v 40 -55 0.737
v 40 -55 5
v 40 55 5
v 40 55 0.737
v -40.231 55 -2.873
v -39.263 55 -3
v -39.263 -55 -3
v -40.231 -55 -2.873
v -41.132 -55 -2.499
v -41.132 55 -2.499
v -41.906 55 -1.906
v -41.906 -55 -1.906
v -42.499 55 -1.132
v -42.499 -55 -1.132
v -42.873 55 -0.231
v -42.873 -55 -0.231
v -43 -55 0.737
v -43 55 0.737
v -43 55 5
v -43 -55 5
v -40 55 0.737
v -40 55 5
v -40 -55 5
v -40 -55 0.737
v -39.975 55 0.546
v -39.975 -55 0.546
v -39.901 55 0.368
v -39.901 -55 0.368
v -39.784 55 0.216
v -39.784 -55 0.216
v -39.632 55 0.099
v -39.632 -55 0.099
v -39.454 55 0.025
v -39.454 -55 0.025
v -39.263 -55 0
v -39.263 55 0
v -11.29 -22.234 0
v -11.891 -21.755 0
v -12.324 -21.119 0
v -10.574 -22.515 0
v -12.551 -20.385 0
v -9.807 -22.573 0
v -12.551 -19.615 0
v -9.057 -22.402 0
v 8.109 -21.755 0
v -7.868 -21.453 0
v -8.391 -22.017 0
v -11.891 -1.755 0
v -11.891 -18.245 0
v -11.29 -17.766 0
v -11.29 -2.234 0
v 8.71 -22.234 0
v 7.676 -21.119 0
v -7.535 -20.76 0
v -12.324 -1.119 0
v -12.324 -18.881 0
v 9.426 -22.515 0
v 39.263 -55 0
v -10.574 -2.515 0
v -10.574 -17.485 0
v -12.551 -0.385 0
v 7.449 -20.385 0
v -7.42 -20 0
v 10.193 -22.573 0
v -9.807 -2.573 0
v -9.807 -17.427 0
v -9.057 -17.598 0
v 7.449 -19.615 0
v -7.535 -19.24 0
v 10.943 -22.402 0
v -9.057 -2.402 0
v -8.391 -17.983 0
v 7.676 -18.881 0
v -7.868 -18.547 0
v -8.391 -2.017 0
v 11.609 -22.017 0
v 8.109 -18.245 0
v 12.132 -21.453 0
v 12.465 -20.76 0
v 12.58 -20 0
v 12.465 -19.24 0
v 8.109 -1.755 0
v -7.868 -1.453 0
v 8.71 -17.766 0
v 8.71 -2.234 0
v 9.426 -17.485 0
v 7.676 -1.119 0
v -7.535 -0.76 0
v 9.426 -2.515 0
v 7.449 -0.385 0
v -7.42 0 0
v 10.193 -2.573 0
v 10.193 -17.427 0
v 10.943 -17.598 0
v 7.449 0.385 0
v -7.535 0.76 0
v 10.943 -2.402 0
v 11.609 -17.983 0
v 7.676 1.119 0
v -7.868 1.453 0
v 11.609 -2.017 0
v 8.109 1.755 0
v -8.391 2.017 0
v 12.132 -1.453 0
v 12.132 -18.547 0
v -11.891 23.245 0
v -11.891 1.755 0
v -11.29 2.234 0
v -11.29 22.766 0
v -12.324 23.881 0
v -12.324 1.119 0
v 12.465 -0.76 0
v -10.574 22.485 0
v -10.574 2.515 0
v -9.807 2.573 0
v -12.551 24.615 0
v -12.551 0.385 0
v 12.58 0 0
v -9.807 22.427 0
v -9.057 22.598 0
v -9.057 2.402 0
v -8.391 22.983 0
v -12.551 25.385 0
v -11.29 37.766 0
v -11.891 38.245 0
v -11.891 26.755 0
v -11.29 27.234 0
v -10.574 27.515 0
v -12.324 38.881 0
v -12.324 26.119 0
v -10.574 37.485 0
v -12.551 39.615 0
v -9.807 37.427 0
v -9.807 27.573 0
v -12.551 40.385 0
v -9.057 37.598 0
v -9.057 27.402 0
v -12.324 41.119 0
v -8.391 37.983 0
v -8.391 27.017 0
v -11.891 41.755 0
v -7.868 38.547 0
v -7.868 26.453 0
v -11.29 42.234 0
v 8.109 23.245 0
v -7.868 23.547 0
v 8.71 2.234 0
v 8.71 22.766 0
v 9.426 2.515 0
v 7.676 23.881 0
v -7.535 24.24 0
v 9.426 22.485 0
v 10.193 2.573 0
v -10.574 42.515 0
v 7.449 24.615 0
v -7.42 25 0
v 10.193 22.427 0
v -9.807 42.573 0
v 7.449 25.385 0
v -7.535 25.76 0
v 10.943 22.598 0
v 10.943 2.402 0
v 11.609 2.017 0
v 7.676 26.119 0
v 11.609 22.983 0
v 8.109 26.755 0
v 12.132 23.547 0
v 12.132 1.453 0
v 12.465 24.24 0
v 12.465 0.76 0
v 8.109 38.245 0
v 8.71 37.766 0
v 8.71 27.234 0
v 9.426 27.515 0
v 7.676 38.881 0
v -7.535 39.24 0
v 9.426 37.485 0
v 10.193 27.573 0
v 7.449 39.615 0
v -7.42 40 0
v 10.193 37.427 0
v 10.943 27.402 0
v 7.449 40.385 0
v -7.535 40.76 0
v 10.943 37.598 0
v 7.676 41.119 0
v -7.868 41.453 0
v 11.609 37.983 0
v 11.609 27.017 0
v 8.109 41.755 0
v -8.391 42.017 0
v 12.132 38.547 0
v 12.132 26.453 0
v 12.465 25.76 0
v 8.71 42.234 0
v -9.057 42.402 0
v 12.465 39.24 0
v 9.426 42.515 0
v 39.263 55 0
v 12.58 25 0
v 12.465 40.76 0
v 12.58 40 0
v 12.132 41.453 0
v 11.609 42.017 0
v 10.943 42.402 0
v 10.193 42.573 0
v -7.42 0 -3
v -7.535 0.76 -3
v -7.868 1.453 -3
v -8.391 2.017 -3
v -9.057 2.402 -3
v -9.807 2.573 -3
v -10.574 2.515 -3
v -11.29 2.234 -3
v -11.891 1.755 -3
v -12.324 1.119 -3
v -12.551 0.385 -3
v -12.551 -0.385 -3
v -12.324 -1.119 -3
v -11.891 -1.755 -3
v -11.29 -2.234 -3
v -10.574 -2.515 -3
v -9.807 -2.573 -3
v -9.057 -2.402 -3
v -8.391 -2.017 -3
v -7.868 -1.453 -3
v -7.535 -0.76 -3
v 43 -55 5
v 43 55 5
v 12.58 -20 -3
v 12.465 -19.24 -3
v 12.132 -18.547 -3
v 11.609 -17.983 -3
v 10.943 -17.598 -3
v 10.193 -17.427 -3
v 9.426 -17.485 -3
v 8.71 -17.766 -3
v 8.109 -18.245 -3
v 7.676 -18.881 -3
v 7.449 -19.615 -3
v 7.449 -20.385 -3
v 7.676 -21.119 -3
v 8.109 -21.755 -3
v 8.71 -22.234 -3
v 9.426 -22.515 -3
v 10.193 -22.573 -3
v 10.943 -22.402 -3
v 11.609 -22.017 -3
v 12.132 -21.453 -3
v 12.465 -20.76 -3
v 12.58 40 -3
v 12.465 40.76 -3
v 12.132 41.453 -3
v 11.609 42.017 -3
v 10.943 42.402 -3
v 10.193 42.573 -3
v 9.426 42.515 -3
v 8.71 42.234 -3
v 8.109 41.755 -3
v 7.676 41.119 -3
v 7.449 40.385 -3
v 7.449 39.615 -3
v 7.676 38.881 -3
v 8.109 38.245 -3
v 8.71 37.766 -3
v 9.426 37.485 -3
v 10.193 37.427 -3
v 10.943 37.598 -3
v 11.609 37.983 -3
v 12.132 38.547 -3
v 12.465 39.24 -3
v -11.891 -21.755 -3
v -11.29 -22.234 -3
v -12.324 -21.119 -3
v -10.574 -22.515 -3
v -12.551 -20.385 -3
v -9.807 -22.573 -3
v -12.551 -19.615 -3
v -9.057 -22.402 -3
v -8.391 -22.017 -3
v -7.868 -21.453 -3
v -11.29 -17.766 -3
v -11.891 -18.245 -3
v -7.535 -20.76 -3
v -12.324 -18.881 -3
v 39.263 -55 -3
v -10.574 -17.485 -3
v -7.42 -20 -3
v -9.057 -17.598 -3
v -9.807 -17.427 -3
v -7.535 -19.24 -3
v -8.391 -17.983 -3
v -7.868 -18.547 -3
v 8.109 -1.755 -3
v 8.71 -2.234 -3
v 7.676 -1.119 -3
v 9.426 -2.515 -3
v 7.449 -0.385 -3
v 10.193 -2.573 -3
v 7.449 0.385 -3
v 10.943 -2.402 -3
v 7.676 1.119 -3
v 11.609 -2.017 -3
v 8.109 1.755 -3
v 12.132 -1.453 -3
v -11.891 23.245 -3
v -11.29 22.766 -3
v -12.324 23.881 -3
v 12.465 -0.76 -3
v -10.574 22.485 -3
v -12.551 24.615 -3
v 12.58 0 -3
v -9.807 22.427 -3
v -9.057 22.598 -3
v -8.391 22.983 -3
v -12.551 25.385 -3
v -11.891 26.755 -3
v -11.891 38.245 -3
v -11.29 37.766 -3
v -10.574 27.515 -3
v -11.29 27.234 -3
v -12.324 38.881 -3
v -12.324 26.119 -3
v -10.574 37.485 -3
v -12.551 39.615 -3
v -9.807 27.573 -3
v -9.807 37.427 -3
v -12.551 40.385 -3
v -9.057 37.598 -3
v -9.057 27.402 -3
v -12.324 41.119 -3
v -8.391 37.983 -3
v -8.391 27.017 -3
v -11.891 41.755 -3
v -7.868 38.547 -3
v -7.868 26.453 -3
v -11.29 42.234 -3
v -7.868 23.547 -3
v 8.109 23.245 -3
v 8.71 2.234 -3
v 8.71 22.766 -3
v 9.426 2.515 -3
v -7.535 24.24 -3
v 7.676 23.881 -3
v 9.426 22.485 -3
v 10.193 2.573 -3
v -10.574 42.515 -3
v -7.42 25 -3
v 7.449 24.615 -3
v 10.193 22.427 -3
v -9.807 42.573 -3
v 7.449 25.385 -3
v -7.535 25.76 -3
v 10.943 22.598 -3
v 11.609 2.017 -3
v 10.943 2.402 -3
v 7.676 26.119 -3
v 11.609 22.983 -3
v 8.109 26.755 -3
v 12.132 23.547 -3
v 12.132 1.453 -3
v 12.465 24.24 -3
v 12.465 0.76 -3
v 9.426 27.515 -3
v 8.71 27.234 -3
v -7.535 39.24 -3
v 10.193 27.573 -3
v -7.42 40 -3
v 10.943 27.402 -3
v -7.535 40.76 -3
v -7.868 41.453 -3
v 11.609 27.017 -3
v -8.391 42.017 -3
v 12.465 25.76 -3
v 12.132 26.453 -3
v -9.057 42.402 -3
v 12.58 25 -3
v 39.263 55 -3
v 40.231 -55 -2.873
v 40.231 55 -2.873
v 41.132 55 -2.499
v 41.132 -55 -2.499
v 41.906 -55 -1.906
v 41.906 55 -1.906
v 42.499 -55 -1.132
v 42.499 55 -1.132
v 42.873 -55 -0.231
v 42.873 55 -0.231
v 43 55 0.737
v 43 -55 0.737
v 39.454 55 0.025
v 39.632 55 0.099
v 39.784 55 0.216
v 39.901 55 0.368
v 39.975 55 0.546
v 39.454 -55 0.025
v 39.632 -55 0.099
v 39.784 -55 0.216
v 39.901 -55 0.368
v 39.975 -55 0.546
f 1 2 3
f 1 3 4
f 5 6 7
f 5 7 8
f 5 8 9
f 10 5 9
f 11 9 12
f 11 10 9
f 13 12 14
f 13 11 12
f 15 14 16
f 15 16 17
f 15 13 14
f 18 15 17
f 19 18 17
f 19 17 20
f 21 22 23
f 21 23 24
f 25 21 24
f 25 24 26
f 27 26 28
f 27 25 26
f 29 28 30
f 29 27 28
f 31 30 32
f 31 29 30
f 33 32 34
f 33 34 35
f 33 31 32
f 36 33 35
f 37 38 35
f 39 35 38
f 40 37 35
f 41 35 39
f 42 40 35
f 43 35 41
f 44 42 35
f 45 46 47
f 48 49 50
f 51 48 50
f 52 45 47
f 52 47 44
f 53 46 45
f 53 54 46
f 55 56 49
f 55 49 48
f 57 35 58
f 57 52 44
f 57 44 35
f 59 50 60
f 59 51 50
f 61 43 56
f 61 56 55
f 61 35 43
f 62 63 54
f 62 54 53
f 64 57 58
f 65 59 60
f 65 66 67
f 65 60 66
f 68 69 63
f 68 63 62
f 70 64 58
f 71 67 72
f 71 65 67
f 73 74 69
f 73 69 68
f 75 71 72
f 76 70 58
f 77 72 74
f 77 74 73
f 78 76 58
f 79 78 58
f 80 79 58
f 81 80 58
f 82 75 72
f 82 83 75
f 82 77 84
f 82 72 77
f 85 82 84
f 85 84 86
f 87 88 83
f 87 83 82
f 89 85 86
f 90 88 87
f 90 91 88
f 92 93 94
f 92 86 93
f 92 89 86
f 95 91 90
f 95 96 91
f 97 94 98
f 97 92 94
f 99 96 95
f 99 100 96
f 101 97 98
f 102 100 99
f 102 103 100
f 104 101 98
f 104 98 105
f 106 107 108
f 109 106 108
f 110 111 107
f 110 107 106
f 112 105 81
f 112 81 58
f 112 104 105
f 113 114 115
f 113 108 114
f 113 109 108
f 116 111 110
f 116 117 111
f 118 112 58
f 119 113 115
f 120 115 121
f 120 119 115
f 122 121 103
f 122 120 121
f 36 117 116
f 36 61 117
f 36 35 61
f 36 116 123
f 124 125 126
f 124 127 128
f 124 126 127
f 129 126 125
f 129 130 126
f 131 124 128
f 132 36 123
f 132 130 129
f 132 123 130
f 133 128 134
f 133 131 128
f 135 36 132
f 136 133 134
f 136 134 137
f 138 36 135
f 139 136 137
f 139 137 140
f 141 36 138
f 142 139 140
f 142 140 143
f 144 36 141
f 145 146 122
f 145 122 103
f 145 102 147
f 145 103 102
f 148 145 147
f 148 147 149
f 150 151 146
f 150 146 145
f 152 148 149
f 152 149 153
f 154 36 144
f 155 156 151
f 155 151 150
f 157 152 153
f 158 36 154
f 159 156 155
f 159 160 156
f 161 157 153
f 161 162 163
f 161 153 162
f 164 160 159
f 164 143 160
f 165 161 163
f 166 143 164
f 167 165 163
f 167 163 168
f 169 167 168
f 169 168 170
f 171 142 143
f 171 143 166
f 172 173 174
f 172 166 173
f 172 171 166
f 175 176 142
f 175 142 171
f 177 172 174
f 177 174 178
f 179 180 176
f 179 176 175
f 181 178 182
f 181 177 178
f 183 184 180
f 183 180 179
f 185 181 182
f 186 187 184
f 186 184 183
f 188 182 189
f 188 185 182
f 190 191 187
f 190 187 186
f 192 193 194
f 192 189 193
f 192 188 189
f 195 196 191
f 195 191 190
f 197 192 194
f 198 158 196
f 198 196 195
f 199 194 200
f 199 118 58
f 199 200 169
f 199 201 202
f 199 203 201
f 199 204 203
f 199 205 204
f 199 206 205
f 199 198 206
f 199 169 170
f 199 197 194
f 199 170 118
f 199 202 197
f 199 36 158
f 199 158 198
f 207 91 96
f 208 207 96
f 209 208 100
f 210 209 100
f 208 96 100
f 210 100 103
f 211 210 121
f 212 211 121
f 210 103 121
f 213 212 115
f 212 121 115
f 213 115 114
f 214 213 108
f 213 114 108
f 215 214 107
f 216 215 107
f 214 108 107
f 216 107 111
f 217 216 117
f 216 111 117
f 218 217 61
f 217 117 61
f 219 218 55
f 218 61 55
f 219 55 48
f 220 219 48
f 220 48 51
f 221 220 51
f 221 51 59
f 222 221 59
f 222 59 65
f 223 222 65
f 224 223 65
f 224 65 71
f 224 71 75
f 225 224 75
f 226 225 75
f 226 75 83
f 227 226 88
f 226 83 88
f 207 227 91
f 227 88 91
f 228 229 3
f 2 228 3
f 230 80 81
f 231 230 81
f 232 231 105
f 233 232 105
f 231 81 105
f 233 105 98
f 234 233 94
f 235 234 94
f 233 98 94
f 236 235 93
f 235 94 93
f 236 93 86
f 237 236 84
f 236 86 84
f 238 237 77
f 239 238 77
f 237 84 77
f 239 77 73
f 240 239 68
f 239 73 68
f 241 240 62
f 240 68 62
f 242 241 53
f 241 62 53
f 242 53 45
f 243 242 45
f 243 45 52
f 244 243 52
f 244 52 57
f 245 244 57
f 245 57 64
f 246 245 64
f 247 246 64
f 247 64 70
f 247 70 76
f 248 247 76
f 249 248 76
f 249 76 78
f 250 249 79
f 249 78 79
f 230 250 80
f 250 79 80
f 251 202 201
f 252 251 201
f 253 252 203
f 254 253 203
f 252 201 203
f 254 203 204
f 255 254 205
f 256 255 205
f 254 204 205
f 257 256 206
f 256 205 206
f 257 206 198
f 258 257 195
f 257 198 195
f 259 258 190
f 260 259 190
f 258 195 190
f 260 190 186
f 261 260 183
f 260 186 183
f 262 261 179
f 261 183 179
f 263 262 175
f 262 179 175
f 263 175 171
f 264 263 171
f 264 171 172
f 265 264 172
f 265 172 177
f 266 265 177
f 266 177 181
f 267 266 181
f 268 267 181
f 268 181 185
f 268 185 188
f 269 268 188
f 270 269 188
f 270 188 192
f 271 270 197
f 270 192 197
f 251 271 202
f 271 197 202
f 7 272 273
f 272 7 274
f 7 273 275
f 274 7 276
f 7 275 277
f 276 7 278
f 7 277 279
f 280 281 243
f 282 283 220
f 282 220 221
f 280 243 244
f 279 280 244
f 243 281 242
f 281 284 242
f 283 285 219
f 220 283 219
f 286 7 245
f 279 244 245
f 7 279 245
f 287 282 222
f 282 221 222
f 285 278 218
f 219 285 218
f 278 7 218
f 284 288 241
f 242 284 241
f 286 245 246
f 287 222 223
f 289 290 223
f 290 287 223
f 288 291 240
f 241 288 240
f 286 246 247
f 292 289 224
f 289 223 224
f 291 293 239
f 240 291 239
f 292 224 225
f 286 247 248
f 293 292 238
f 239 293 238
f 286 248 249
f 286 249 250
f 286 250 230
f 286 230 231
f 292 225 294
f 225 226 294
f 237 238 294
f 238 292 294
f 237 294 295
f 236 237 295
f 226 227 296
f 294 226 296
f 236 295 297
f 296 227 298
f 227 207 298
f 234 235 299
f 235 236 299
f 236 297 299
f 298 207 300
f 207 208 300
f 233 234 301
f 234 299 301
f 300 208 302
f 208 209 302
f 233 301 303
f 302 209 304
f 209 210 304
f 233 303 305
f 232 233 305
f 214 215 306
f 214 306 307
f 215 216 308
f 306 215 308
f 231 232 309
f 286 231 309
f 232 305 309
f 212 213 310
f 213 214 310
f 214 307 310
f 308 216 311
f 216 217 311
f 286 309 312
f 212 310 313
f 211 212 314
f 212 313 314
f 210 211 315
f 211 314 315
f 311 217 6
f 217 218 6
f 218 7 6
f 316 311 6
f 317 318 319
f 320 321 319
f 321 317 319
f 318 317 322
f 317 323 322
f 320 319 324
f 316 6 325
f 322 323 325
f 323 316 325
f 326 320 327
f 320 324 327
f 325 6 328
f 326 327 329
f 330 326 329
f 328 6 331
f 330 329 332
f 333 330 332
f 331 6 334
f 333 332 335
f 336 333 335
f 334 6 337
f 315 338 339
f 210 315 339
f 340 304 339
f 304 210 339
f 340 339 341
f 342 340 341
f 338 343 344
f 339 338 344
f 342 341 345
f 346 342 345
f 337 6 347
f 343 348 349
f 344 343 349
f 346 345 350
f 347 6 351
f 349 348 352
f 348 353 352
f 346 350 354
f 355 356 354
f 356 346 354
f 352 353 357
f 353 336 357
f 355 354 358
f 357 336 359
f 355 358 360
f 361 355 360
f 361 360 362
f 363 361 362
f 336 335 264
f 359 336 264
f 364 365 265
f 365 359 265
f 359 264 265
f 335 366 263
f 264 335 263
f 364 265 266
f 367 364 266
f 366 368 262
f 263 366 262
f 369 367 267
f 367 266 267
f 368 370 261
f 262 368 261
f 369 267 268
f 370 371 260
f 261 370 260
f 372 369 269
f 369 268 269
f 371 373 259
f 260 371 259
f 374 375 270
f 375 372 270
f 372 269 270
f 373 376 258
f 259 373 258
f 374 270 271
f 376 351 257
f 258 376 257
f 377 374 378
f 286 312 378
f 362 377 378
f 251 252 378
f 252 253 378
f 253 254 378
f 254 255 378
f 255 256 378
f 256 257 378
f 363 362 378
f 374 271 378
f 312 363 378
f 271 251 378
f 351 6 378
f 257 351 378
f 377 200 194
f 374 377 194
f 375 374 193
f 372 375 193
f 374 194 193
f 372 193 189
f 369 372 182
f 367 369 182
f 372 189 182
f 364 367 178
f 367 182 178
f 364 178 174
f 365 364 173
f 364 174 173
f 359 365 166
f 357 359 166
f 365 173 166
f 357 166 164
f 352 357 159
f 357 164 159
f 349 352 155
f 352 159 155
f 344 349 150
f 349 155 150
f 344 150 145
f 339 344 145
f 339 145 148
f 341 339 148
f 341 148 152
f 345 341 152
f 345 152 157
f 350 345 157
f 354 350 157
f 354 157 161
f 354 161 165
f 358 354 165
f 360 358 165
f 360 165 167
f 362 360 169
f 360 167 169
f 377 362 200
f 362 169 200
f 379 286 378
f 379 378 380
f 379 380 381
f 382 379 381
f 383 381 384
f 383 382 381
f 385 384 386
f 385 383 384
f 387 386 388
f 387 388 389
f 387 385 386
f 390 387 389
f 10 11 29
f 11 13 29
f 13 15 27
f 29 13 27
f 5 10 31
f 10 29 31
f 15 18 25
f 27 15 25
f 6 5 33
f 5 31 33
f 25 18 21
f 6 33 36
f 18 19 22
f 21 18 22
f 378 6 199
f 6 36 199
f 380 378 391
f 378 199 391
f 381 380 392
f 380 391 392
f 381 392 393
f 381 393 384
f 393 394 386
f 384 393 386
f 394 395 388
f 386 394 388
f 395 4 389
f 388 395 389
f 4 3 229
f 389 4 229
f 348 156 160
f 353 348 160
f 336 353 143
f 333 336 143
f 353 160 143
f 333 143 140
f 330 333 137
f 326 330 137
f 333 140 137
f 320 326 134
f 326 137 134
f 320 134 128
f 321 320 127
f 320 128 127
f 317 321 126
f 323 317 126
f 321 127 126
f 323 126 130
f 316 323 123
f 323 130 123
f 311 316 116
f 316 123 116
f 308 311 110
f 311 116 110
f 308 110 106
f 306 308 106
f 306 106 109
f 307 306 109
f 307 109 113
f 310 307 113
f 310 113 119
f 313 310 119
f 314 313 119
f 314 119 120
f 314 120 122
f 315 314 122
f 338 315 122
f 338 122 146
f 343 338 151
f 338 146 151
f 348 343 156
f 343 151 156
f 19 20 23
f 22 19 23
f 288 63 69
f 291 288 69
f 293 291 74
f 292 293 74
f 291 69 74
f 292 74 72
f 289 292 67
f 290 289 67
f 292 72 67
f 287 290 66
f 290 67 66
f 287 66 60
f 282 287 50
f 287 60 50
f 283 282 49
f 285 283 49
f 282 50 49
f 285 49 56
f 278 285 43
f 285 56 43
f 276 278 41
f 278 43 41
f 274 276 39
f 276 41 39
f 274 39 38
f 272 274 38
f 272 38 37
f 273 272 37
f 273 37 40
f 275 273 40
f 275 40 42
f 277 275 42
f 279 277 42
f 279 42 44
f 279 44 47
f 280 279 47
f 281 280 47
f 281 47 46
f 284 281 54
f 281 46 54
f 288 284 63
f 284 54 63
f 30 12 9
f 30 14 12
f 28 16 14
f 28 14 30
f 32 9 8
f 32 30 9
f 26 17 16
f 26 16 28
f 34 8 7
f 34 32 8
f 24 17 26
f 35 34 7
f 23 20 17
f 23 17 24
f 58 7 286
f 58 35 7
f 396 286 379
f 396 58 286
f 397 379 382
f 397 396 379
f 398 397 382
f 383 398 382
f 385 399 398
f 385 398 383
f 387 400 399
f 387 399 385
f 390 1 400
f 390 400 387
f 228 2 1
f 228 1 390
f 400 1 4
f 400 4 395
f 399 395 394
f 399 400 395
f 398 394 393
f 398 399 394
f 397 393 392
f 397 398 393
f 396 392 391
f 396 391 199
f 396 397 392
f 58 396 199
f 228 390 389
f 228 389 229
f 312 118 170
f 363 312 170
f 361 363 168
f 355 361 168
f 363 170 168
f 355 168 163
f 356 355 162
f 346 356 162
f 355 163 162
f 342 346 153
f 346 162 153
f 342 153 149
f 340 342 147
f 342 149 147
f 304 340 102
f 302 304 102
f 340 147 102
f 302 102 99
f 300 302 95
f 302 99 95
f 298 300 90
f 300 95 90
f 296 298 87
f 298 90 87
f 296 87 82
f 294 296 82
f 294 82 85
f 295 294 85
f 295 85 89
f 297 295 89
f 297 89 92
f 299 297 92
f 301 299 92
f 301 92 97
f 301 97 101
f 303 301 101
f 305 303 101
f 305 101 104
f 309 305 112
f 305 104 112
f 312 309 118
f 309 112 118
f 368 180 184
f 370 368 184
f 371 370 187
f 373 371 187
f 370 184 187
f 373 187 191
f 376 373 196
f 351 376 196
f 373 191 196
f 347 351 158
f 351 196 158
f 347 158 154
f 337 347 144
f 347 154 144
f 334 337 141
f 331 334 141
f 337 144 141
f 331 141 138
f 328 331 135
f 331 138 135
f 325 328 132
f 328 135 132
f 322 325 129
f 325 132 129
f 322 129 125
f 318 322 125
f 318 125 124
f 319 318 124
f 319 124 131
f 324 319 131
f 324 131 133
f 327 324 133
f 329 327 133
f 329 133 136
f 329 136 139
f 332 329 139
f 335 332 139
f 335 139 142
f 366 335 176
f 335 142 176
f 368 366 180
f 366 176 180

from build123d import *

# Parameters (mm, degrees)
SKETCH1_W                      = 86
SKETCH1_H                      = 110
BASE_FLANGE1_DEPTH             = 3
SKETCH6_R                      = 2.58
CUT_EXTRUDE1_DEPTH             = 3
EDGE_FLANGE1_STRIP_W           = 13.4732
EDGE_FLANGE1_STRIP_H           = 3
EDGE_FLANGE1_STRIP_CUT_DEPTH   = 110
EDGE_FLANGE1_STRIP_2_W         = 13.4732
EDGE_FLANGE1_STRIP_2_H         = 3
EDGE_FLANGE1_STRIP_CUT_2_DEPTH = 110
EDGE_FLANGE1_DEPTH             = 110
EDGE_FLANGE1_BEND_DEPTH        = 110


# Sheet-metal steps are written as plain solids
with BuildPart() as part:
    # Sketch1 → Base-Flange1 (new body)
    with BuildSketch(Plane.XY):
        Rectangle(SKETCH1_W, SKETCH1_H)
    extrude(amount=-BASE_FLANGE1_DEPTH)

    # Sketch6 → Cut-Extrude1 (cut)
    with BuildSketch(Plane.XY):
        with Locations((-10, 40)):
            Circle(SKETCH6_R)
        with Locations((10, 40)):
            Circle(SKETCH6_R)
        with Locations((-10, 25)):
            Circle(SKETCH6_R)
        with Locations((10, 25)):
            Circle(SKETCH6_R)
        with Locations((10, 0)):
            Circle(SKETCH6_R)
        with Locations((-10, 0)):
            Circle(SKETCH6_R)
        with Locations((-10, -20)):
            Circle(SKETCH6_R)
        with Locations((10, -20)):
            Circle(SKETCH6_R)
    extrude(amount=-CUT_EXTRUDE1_DEPTH, mode=Mode.SUBTRACT)

    # Edge-Flange1 strip (across the edge) → Edge-Flange1 strip cut (cut)
    with BuildSketch(Plane(origin=(-43, 55, 0), x_dir=(1, 0, 0), z_dir=(0, -1, 0))):
        with Locations((-3, -1.5)):
            Rectangle(EDGE_FLANGE1_STRIP_W, EDGE_FLANGE1_STRIP_H)
    extrude(amount=EDGE_FLANGE1_STRIP_CUT_DEPTH, mode=Mode.SUBTRACT)

    # Edge-Flange1 strip 2 (across the edge) → Edge-Flange1 strip cut 2 (cut)
    with BuildSketch(Plane(origin=(43, -55, 0), x_dir=(-1, 0, 0), z_dir=(0, 1, 0))):
        with Locations((-3, -1.5)):
            Rectangle(EDGE_FLANGE1_STRIP_2_W, EDGE_FLANGE1_STRIP_2_H)
    extrude(amount=EDGE_FLANGE1_STRIP_CUT_2_DEPTH, mode=Mode.SUBTRACT)

    # Edge-Flange1 section (across the edge) → Edge-Flange1 (add)
    with BuildSketch(Plane(origin=(-43, 55, 0), x_dir=(1, 0, 0), z_dir=(0, -1, 0))):
        with BuildLine():
            Line((0, 0.7366), (0, 5))
            Line((0, 5), (3, 5))
            Line((3, 5), (3, 0.7366))
            ThreePointArc((3, 0.7366), (3.215745145, 0.215745145), (3.7366, 0))
            Line((3.7366, 0), (3.7366, -3))
            ThreePointArc((3.7366, -3), (1.094424801, -1.905575199), (0, 0.7366))
        make_face()
    extrude(amount=EDGE_FLANGE1_DEPTH)

    # Edge-Flange1 section 2 (across the edge) → Edge-Flange1 bend (add)
    with BuildSketch(Plane(origin=(43, -55, 0), x_dir=(-1, 0, 0), z_dir=(0, 1, 0))):
        with BuildLine():
            Line((0, 0.7366), (0, 5))
            Line((0, 5), (3, 5))
            Line((3, 5), (3, 0.7366))
            ThreePointArc((3, 0.7366), (3.215745145, 0.215745145), (3.7366, 0))
            Line((3.7366, 0), (3.7366, -3))
            ThreePointArc((3.7366, -3), (1.094424801, -1.905575199), (0, 0.7366))
        make_face()
    extrude(amount=EDGE_FLANGE1_BEND_DEPTH)


solid = part.part
